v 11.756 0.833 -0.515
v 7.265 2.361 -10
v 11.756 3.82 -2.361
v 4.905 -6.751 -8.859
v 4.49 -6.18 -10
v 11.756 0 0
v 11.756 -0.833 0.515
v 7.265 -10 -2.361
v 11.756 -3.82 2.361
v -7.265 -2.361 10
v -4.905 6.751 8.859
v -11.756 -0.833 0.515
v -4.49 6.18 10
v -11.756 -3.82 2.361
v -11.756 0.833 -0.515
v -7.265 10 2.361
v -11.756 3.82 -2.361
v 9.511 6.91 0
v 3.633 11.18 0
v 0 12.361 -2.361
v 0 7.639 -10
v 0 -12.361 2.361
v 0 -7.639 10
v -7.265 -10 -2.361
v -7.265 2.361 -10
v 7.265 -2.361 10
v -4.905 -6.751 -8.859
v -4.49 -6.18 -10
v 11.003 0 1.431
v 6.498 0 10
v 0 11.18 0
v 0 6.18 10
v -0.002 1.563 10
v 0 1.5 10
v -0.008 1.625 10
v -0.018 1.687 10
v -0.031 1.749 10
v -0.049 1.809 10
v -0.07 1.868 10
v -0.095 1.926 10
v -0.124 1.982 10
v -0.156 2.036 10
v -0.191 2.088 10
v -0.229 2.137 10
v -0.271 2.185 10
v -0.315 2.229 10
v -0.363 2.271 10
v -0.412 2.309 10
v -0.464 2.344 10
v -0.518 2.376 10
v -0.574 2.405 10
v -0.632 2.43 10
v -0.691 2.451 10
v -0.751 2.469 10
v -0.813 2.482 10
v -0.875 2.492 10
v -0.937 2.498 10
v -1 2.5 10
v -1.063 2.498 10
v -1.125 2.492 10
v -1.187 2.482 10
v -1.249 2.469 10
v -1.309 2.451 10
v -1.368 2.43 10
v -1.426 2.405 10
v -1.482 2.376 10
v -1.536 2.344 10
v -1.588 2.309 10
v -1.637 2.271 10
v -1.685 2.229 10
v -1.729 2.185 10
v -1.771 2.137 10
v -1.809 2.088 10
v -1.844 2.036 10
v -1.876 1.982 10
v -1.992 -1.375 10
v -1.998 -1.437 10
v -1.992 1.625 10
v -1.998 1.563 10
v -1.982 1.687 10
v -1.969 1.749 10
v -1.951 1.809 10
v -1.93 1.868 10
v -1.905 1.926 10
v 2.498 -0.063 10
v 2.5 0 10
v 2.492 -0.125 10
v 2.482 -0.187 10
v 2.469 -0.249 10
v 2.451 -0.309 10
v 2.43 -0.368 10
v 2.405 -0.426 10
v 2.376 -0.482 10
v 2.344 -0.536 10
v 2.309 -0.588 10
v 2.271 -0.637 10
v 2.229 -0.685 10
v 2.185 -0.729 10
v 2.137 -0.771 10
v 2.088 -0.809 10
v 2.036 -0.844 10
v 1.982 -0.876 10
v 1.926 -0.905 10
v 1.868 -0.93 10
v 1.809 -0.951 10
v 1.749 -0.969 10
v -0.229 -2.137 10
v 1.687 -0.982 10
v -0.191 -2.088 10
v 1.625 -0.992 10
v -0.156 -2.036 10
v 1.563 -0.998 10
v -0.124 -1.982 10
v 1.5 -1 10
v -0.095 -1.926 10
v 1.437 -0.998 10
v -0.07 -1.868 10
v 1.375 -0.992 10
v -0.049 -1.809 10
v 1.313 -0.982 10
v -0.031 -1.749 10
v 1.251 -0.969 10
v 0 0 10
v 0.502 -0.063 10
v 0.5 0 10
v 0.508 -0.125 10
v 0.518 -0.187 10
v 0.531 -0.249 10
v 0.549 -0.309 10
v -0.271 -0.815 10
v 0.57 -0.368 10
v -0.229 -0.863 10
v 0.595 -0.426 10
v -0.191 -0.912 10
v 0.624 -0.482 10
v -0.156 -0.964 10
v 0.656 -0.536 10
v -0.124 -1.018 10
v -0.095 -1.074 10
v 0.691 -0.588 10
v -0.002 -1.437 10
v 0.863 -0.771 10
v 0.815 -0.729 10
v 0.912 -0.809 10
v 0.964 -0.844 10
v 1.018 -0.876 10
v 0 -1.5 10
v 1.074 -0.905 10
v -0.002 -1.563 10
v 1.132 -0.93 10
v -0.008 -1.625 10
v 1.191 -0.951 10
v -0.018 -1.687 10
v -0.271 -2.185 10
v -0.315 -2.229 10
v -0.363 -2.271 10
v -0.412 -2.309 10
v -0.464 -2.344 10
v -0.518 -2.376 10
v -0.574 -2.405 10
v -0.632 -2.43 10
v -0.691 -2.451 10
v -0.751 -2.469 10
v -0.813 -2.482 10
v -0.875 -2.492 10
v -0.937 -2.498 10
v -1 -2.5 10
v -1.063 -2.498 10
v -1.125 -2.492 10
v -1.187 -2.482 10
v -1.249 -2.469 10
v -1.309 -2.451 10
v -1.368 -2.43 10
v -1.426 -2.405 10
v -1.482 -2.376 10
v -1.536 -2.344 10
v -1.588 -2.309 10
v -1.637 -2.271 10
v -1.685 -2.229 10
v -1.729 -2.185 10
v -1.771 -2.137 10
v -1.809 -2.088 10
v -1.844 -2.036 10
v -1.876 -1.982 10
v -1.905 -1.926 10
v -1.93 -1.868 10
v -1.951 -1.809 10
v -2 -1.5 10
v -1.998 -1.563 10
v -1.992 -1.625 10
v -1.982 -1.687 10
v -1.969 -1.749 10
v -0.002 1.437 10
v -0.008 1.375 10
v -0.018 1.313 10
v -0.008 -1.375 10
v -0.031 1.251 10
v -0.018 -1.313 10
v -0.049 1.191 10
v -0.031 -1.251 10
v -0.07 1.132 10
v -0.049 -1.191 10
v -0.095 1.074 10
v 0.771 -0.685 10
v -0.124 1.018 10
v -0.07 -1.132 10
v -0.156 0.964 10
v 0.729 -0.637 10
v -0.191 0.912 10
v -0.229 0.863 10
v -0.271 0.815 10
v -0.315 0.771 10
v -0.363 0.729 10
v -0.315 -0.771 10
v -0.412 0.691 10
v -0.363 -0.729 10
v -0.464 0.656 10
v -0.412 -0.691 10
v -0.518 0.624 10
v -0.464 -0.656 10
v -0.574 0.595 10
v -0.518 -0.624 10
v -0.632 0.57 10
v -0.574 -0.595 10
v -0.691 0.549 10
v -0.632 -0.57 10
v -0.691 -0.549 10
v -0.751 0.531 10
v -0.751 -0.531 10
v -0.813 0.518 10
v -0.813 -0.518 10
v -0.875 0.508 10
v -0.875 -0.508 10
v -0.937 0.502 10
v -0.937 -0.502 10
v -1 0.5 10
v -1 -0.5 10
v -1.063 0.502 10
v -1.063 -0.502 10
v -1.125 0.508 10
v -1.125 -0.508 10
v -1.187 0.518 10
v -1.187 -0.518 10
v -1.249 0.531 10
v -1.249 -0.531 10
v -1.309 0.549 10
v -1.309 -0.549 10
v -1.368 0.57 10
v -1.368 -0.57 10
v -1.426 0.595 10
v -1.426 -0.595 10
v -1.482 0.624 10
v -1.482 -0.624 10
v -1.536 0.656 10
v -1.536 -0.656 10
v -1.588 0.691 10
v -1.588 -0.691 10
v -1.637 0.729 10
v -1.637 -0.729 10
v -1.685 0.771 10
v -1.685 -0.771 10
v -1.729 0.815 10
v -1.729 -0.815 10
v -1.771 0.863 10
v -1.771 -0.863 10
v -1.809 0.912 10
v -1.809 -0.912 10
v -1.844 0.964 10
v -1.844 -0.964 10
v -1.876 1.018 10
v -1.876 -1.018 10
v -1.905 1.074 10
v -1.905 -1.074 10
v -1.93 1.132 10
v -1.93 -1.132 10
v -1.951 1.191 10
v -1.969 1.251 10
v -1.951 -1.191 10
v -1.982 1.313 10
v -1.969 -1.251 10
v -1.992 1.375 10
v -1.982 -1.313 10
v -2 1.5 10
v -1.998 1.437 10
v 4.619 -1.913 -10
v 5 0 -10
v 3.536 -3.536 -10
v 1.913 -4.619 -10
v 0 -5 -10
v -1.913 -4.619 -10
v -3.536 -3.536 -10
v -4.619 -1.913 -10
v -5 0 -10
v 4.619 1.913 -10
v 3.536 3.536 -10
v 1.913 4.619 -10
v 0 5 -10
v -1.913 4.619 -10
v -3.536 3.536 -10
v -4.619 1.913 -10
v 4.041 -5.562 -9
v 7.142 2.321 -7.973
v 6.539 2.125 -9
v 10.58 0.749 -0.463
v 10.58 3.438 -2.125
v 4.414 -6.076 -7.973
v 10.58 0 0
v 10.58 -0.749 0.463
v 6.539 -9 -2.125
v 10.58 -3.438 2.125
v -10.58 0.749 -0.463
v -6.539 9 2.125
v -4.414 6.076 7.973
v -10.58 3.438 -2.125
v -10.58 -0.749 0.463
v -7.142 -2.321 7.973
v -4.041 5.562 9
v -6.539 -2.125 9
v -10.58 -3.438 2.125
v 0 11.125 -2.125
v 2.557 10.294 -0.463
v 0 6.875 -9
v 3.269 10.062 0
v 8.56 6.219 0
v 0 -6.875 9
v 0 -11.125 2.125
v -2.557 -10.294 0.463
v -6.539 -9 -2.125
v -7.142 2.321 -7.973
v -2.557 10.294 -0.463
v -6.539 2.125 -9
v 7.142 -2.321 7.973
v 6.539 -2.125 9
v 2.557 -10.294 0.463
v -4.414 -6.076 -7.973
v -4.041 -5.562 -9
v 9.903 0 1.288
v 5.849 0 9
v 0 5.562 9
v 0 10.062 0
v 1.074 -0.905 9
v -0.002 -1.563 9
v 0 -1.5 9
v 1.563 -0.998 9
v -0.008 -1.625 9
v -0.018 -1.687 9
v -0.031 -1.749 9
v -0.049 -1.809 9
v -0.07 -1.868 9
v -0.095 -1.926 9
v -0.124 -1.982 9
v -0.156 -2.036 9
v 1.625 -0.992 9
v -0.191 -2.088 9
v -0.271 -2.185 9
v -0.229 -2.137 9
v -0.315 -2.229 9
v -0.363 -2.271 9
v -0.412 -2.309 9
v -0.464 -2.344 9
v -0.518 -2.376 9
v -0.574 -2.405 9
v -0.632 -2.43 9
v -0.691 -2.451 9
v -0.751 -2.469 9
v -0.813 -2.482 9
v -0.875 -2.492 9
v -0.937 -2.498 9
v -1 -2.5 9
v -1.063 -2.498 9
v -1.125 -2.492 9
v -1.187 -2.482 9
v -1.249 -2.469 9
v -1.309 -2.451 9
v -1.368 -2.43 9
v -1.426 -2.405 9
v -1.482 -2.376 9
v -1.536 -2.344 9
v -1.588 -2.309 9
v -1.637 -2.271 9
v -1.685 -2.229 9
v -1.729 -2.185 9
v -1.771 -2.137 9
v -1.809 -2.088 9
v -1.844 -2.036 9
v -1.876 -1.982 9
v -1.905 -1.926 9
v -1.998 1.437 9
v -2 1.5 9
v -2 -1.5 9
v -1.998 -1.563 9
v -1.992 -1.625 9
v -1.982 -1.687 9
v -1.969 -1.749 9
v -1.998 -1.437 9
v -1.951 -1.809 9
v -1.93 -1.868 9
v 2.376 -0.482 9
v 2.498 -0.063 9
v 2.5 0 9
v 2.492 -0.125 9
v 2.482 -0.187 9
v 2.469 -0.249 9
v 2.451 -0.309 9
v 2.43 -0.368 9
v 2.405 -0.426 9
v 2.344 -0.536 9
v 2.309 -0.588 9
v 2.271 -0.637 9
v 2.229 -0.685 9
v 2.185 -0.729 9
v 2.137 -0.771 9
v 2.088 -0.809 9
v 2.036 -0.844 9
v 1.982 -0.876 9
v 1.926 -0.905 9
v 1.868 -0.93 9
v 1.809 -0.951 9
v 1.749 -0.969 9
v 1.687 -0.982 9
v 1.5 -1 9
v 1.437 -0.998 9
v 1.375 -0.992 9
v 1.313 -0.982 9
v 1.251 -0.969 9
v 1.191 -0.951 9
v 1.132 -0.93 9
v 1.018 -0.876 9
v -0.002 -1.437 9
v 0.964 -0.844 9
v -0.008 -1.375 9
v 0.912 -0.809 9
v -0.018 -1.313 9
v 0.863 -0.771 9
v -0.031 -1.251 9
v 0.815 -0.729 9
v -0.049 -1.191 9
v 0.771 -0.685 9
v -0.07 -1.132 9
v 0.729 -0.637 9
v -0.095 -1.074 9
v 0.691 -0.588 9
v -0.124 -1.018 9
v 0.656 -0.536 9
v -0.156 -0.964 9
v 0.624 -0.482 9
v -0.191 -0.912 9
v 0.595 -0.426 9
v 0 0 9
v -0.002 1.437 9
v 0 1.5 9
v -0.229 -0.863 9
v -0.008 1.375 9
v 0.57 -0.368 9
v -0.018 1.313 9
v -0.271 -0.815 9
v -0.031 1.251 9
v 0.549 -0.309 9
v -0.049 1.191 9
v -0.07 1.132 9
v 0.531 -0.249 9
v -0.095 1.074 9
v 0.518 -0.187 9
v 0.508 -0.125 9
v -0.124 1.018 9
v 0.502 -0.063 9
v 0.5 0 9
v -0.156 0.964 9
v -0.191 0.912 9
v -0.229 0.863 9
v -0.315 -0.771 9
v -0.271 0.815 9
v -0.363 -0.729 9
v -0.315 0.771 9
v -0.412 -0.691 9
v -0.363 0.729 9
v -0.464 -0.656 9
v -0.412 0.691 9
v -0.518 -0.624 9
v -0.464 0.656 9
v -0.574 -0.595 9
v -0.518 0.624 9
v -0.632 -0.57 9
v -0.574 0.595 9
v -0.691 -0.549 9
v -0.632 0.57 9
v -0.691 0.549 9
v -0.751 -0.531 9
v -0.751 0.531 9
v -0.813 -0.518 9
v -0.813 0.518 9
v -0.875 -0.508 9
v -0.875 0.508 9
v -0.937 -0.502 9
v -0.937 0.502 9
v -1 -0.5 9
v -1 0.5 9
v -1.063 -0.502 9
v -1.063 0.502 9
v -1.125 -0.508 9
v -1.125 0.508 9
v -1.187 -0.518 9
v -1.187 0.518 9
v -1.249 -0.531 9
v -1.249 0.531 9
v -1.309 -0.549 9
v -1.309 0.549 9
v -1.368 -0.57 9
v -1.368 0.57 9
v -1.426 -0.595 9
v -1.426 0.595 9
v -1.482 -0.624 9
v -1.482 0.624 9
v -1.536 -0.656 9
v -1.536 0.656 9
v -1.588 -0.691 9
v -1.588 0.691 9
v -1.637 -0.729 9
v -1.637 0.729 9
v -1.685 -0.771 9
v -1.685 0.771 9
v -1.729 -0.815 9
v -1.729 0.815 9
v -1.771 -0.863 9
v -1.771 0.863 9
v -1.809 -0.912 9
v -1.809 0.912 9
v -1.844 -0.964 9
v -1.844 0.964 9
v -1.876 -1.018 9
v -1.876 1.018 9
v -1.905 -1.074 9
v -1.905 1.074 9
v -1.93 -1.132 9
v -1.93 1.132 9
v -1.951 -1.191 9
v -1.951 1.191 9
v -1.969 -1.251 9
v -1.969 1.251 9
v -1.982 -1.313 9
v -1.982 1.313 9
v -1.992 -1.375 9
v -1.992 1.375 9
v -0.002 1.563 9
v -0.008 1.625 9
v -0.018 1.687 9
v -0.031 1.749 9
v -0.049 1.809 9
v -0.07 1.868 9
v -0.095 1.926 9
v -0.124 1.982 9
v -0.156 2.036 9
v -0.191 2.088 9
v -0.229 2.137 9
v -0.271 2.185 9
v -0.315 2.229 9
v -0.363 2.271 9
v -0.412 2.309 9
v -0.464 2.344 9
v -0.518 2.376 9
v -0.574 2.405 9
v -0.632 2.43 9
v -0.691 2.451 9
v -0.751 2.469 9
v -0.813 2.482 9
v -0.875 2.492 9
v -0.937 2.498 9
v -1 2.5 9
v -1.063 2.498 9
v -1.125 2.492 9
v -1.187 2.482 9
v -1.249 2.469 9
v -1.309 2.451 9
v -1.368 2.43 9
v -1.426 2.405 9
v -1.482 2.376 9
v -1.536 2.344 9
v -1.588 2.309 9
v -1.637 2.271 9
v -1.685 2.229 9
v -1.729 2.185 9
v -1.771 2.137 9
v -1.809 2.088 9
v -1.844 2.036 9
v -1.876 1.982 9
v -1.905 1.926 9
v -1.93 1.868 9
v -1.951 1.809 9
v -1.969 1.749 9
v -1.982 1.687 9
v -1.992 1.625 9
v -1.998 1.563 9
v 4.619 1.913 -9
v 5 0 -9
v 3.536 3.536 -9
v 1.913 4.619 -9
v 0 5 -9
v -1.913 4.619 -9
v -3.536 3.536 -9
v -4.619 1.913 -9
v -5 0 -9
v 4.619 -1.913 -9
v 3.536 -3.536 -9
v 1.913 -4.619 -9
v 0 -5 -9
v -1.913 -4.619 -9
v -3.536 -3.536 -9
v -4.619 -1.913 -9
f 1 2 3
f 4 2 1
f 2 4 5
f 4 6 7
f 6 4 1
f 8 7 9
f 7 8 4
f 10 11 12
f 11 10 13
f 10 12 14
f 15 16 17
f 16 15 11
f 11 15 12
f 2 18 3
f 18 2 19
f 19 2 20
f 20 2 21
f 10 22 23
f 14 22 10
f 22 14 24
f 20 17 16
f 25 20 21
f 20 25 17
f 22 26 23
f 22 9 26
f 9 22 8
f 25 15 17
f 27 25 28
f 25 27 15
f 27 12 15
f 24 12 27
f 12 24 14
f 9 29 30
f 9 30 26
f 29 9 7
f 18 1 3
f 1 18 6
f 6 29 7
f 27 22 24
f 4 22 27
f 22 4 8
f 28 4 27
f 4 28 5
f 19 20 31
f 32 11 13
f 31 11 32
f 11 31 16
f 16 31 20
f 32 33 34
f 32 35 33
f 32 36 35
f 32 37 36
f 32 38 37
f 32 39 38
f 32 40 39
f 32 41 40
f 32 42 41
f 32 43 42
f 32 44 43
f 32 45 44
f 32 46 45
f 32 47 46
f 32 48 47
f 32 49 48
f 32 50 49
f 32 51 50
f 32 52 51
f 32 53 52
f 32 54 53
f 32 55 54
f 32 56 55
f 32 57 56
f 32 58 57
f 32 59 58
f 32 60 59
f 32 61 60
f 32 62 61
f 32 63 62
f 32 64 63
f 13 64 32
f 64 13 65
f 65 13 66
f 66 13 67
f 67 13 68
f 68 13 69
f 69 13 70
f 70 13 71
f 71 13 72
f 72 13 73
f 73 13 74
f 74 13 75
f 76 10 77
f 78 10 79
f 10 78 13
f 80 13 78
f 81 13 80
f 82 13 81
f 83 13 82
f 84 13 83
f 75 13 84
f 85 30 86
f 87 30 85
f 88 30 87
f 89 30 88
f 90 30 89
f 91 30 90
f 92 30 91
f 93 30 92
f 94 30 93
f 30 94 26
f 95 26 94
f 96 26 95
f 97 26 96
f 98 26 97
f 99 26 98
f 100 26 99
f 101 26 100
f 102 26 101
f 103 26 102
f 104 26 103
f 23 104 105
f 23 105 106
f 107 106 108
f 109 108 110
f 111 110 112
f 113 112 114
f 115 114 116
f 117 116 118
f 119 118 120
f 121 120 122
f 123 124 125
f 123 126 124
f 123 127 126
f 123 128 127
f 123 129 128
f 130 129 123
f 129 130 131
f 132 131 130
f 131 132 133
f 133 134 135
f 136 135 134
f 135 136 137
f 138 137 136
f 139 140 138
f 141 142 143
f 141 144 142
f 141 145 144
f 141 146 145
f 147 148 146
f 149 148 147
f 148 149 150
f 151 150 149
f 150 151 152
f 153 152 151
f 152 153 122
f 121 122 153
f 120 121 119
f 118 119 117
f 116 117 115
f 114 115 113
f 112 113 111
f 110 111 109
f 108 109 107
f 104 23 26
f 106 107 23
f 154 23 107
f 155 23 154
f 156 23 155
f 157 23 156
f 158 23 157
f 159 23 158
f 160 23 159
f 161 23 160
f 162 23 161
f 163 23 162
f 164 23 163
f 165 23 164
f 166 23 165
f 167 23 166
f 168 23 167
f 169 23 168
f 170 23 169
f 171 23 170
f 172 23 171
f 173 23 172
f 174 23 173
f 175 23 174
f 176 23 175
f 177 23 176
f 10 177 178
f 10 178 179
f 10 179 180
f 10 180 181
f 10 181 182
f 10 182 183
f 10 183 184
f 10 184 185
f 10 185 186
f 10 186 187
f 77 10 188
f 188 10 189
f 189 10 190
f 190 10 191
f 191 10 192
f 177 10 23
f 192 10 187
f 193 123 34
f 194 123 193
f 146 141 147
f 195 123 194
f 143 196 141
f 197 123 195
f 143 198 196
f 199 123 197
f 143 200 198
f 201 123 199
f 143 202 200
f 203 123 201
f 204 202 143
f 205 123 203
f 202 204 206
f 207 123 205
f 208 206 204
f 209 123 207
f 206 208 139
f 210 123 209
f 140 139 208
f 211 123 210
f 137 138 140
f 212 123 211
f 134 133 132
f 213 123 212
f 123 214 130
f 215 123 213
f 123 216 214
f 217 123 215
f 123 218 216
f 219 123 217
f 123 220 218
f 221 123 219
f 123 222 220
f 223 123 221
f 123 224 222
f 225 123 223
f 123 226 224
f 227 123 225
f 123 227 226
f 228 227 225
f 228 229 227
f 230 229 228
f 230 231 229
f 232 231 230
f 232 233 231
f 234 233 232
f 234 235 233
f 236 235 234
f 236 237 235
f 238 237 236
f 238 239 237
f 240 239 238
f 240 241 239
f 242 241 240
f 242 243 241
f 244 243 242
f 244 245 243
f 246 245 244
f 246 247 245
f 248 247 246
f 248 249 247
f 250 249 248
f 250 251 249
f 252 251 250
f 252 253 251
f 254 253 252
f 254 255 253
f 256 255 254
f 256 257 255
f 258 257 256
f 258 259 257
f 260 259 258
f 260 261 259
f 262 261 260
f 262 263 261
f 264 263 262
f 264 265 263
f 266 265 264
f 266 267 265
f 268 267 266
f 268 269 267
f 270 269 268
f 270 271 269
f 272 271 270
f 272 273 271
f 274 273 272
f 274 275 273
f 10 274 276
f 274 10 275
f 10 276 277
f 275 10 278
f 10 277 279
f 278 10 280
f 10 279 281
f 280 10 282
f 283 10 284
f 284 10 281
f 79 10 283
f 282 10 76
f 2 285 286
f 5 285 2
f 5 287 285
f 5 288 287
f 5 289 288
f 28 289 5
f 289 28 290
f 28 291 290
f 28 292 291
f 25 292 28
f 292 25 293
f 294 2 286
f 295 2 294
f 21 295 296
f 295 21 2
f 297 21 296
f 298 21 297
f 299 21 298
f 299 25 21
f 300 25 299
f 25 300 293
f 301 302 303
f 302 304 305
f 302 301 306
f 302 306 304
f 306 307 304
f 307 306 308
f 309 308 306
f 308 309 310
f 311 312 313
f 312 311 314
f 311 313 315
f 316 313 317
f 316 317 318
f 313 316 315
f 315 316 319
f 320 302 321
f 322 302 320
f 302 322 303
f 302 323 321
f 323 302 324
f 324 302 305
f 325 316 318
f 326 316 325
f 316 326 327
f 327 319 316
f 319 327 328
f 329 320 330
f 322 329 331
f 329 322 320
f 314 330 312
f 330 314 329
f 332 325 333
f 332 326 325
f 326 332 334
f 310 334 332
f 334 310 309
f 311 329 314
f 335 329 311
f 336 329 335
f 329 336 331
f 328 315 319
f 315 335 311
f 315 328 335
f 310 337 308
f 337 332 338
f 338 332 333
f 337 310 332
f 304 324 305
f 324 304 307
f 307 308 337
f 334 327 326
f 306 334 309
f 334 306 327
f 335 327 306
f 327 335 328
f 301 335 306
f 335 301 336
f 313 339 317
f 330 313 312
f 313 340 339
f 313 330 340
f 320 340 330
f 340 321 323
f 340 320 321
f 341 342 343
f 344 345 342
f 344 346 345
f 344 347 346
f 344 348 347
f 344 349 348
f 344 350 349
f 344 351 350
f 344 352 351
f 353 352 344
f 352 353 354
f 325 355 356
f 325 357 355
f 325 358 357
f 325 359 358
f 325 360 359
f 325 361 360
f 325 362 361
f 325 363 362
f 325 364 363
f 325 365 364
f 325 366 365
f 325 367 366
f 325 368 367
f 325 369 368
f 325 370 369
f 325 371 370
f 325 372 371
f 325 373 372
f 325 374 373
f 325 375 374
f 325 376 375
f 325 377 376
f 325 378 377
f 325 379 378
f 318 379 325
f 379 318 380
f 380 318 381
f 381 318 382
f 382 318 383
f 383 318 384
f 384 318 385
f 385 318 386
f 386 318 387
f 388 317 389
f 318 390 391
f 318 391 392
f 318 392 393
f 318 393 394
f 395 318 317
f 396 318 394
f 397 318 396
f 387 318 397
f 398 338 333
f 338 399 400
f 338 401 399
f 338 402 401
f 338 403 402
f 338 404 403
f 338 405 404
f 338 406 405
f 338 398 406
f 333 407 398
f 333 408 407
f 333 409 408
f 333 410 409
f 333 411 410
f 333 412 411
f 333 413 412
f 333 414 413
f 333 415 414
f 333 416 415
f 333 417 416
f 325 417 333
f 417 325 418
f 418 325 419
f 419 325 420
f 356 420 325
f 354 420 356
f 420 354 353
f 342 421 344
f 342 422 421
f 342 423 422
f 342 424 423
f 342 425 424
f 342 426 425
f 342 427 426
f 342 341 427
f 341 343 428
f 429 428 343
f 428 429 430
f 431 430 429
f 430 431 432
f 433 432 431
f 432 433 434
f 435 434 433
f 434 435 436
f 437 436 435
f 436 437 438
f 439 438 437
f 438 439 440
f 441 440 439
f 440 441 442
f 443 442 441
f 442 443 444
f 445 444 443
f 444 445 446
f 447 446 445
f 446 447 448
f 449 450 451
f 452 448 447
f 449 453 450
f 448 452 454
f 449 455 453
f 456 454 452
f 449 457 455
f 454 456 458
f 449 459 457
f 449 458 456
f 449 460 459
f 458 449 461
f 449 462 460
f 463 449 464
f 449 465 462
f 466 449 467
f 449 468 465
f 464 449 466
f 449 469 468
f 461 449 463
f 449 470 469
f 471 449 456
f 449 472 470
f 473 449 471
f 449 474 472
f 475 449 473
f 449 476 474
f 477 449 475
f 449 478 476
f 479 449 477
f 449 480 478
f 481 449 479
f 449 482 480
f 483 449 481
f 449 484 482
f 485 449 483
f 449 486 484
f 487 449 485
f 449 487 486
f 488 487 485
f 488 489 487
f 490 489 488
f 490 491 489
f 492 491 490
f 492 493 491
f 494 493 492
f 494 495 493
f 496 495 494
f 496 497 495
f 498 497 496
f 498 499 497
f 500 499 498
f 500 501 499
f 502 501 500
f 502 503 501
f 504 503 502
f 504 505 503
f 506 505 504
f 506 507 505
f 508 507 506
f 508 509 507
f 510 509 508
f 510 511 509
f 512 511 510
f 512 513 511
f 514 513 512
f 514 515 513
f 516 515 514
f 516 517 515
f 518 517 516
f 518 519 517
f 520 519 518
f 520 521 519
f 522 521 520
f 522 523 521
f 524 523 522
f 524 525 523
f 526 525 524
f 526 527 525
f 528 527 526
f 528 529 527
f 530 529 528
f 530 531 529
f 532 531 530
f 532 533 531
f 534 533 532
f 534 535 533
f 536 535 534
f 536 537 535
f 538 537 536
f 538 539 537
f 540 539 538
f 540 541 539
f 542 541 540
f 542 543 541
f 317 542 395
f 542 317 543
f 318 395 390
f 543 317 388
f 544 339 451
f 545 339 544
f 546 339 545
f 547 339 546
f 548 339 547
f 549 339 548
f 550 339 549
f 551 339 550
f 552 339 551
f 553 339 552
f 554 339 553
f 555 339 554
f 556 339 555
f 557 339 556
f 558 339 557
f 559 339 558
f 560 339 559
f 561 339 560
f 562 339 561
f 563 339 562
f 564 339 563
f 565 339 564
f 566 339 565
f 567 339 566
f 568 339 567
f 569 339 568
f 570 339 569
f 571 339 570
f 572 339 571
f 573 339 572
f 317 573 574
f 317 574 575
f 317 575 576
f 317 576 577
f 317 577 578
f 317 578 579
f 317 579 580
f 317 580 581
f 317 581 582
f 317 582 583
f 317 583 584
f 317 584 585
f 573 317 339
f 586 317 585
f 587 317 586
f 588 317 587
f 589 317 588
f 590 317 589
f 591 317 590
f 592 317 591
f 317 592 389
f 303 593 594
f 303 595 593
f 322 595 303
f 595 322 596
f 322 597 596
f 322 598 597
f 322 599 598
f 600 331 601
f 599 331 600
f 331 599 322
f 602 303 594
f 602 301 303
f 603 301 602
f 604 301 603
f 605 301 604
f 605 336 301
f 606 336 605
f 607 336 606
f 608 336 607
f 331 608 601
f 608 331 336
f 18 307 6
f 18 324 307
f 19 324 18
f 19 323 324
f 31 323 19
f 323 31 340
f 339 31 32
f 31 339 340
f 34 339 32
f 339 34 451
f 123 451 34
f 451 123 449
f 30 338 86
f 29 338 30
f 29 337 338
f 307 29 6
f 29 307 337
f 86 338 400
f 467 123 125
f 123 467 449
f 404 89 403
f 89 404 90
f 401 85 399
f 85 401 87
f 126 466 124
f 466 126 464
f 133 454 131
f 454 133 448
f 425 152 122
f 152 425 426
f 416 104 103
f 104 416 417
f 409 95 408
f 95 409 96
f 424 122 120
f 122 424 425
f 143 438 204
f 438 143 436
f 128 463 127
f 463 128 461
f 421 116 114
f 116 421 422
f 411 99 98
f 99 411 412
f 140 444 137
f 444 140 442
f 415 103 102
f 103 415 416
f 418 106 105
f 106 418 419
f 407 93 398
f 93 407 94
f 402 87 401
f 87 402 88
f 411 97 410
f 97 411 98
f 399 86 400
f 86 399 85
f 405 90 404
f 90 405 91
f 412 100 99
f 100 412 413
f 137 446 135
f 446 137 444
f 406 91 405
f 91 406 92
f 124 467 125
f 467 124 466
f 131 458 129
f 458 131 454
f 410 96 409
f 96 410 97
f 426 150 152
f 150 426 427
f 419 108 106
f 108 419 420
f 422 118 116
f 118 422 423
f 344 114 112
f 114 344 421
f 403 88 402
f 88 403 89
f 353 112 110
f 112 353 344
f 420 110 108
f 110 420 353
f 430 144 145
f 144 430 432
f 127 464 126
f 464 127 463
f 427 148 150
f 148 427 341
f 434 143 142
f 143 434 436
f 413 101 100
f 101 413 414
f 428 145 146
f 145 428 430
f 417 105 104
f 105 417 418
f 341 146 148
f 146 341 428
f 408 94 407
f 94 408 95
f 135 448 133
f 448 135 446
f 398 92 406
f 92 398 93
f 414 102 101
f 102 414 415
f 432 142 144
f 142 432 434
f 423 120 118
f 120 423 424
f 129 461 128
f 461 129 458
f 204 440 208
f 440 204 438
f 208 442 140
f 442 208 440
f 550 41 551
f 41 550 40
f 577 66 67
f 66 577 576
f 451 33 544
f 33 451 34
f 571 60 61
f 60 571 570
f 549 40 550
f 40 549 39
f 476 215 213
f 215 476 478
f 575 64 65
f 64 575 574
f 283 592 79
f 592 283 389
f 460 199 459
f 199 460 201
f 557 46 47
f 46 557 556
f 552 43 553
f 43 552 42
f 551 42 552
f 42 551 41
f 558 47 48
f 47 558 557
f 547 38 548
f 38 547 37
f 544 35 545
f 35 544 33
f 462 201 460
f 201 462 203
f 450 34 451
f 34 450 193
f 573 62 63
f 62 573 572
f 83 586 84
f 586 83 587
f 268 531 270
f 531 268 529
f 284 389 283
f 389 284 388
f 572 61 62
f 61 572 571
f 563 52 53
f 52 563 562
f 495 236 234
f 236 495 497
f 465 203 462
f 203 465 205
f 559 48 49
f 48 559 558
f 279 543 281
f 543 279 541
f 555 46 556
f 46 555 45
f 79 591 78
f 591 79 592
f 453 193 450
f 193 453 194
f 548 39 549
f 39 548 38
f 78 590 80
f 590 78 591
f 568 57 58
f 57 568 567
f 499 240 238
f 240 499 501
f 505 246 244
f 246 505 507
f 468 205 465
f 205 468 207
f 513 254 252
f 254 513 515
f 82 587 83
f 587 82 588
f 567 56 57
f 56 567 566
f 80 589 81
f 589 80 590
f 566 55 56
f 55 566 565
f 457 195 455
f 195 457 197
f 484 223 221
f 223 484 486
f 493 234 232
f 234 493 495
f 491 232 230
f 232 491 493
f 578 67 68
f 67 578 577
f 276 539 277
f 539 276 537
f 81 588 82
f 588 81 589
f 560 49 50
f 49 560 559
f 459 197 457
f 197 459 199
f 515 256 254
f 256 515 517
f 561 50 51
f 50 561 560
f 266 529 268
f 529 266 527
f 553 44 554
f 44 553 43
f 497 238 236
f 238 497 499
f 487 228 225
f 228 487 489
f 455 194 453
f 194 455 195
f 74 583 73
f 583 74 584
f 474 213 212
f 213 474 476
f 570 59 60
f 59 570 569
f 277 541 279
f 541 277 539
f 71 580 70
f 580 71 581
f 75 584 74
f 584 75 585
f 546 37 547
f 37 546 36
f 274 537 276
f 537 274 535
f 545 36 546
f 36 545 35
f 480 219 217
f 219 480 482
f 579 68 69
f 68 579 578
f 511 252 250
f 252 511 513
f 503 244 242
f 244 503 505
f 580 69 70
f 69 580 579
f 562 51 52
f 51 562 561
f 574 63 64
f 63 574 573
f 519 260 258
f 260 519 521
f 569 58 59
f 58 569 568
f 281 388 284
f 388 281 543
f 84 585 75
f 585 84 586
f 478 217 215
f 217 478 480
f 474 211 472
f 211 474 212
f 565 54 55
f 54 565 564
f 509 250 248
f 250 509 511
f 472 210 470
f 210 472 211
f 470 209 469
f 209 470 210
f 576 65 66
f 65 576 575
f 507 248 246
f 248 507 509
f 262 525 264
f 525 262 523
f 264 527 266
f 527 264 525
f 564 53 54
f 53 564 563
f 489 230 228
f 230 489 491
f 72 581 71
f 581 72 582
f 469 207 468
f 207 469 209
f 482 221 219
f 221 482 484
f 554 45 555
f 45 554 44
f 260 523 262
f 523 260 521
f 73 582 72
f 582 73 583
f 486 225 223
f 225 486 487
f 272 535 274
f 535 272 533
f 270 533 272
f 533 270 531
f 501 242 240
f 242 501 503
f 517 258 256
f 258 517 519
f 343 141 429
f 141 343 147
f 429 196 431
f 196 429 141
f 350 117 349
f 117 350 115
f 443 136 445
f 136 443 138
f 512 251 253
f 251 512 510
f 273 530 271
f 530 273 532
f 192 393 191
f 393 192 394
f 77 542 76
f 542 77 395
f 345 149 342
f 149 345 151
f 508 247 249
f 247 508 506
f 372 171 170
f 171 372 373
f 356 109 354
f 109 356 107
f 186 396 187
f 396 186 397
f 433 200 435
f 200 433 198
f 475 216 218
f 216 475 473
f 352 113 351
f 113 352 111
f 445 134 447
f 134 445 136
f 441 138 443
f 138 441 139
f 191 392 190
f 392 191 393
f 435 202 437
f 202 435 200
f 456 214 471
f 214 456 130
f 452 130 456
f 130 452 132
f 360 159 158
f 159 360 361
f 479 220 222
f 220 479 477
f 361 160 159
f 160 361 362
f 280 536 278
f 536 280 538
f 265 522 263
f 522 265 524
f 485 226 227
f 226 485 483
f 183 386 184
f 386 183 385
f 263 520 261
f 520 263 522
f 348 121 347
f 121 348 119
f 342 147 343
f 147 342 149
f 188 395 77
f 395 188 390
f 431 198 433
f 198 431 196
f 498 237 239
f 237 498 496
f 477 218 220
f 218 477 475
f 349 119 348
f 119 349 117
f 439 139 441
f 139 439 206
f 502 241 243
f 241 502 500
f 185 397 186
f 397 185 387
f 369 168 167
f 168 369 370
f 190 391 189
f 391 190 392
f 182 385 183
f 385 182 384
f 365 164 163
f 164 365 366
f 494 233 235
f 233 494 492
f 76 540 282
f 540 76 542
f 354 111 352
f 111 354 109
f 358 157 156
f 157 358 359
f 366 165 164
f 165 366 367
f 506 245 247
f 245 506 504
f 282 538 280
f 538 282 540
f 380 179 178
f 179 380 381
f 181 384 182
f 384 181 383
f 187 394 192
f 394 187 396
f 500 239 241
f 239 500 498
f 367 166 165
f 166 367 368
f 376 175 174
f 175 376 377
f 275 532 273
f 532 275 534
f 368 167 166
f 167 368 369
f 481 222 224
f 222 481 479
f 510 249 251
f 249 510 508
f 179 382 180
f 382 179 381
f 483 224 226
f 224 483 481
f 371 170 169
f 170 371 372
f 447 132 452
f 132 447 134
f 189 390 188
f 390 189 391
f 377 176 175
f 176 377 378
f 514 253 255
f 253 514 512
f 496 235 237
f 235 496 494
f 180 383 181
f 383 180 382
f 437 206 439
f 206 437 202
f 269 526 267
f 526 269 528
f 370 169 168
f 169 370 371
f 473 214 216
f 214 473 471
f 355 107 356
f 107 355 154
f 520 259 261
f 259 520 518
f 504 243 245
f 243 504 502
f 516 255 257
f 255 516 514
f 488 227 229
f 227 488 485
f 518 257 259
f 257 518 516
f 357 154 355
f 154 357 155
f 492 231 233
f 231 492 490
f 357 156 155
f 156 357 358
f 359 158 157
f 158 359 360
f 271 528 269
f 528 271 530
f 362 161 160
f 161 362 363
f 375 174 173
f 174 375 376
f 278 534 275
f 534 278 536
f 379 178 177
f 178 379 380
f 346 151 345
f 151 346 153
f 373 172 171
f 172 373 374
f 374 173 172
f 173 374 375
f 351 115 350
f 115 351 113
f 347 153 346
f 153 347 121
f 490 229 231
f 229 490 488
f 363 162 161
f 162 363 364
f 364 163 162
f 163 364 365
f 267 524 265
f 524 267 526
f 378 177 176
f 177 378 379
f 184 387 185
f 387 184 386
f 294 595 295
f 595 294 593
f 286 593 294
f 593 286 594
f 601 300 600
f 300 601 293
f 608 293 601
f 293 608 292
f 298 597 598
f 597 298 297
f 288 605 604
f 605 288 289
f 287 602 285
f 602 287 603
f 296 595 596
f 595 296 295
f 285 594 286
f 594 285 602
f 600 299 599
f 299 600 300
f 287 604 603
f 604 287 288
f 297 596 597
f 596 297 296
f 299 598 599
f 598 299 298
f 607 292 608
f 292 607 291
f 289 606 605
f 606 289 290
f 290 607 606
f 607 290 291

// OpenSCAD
//saltshaker 

//modules
module box(size) {
    cube([2*size, 2*size, size], center = true); 
}

module dodecahedron(size) {
      dihedral = 116.565;
      intersection(){
            box(size);
            intersection_for(i=[1:5])  { 
                rotate([dihedral, 0, 360 / 5 * i])  box(size); 
           }
      }
}

//difference

 difference()
{
        dodecahedron(20);
    dodecahedron(18);
    cube(12);
   translate([1.5,0,0])
    cylinder(12, $fn= 100);
    translate([-1,1.5,0])
    cylinder(12, $fn= 100);
     translate([-1,-1.5,0])
    cylinder(12, $fn= 100);
      translate([0,0,-15])
    cylinder(h = 9, r = 5, center = false);
    
}

//base
{
    translate([0,0,-15])
    circle(d = 9.5);
     translate([0,0,-16])
    circle(d = 12);
       
}
{
     translate([0,0,-10.5])
    rotate(17.6,17.6,17.6) circle(7.6, $fn=5);
}
